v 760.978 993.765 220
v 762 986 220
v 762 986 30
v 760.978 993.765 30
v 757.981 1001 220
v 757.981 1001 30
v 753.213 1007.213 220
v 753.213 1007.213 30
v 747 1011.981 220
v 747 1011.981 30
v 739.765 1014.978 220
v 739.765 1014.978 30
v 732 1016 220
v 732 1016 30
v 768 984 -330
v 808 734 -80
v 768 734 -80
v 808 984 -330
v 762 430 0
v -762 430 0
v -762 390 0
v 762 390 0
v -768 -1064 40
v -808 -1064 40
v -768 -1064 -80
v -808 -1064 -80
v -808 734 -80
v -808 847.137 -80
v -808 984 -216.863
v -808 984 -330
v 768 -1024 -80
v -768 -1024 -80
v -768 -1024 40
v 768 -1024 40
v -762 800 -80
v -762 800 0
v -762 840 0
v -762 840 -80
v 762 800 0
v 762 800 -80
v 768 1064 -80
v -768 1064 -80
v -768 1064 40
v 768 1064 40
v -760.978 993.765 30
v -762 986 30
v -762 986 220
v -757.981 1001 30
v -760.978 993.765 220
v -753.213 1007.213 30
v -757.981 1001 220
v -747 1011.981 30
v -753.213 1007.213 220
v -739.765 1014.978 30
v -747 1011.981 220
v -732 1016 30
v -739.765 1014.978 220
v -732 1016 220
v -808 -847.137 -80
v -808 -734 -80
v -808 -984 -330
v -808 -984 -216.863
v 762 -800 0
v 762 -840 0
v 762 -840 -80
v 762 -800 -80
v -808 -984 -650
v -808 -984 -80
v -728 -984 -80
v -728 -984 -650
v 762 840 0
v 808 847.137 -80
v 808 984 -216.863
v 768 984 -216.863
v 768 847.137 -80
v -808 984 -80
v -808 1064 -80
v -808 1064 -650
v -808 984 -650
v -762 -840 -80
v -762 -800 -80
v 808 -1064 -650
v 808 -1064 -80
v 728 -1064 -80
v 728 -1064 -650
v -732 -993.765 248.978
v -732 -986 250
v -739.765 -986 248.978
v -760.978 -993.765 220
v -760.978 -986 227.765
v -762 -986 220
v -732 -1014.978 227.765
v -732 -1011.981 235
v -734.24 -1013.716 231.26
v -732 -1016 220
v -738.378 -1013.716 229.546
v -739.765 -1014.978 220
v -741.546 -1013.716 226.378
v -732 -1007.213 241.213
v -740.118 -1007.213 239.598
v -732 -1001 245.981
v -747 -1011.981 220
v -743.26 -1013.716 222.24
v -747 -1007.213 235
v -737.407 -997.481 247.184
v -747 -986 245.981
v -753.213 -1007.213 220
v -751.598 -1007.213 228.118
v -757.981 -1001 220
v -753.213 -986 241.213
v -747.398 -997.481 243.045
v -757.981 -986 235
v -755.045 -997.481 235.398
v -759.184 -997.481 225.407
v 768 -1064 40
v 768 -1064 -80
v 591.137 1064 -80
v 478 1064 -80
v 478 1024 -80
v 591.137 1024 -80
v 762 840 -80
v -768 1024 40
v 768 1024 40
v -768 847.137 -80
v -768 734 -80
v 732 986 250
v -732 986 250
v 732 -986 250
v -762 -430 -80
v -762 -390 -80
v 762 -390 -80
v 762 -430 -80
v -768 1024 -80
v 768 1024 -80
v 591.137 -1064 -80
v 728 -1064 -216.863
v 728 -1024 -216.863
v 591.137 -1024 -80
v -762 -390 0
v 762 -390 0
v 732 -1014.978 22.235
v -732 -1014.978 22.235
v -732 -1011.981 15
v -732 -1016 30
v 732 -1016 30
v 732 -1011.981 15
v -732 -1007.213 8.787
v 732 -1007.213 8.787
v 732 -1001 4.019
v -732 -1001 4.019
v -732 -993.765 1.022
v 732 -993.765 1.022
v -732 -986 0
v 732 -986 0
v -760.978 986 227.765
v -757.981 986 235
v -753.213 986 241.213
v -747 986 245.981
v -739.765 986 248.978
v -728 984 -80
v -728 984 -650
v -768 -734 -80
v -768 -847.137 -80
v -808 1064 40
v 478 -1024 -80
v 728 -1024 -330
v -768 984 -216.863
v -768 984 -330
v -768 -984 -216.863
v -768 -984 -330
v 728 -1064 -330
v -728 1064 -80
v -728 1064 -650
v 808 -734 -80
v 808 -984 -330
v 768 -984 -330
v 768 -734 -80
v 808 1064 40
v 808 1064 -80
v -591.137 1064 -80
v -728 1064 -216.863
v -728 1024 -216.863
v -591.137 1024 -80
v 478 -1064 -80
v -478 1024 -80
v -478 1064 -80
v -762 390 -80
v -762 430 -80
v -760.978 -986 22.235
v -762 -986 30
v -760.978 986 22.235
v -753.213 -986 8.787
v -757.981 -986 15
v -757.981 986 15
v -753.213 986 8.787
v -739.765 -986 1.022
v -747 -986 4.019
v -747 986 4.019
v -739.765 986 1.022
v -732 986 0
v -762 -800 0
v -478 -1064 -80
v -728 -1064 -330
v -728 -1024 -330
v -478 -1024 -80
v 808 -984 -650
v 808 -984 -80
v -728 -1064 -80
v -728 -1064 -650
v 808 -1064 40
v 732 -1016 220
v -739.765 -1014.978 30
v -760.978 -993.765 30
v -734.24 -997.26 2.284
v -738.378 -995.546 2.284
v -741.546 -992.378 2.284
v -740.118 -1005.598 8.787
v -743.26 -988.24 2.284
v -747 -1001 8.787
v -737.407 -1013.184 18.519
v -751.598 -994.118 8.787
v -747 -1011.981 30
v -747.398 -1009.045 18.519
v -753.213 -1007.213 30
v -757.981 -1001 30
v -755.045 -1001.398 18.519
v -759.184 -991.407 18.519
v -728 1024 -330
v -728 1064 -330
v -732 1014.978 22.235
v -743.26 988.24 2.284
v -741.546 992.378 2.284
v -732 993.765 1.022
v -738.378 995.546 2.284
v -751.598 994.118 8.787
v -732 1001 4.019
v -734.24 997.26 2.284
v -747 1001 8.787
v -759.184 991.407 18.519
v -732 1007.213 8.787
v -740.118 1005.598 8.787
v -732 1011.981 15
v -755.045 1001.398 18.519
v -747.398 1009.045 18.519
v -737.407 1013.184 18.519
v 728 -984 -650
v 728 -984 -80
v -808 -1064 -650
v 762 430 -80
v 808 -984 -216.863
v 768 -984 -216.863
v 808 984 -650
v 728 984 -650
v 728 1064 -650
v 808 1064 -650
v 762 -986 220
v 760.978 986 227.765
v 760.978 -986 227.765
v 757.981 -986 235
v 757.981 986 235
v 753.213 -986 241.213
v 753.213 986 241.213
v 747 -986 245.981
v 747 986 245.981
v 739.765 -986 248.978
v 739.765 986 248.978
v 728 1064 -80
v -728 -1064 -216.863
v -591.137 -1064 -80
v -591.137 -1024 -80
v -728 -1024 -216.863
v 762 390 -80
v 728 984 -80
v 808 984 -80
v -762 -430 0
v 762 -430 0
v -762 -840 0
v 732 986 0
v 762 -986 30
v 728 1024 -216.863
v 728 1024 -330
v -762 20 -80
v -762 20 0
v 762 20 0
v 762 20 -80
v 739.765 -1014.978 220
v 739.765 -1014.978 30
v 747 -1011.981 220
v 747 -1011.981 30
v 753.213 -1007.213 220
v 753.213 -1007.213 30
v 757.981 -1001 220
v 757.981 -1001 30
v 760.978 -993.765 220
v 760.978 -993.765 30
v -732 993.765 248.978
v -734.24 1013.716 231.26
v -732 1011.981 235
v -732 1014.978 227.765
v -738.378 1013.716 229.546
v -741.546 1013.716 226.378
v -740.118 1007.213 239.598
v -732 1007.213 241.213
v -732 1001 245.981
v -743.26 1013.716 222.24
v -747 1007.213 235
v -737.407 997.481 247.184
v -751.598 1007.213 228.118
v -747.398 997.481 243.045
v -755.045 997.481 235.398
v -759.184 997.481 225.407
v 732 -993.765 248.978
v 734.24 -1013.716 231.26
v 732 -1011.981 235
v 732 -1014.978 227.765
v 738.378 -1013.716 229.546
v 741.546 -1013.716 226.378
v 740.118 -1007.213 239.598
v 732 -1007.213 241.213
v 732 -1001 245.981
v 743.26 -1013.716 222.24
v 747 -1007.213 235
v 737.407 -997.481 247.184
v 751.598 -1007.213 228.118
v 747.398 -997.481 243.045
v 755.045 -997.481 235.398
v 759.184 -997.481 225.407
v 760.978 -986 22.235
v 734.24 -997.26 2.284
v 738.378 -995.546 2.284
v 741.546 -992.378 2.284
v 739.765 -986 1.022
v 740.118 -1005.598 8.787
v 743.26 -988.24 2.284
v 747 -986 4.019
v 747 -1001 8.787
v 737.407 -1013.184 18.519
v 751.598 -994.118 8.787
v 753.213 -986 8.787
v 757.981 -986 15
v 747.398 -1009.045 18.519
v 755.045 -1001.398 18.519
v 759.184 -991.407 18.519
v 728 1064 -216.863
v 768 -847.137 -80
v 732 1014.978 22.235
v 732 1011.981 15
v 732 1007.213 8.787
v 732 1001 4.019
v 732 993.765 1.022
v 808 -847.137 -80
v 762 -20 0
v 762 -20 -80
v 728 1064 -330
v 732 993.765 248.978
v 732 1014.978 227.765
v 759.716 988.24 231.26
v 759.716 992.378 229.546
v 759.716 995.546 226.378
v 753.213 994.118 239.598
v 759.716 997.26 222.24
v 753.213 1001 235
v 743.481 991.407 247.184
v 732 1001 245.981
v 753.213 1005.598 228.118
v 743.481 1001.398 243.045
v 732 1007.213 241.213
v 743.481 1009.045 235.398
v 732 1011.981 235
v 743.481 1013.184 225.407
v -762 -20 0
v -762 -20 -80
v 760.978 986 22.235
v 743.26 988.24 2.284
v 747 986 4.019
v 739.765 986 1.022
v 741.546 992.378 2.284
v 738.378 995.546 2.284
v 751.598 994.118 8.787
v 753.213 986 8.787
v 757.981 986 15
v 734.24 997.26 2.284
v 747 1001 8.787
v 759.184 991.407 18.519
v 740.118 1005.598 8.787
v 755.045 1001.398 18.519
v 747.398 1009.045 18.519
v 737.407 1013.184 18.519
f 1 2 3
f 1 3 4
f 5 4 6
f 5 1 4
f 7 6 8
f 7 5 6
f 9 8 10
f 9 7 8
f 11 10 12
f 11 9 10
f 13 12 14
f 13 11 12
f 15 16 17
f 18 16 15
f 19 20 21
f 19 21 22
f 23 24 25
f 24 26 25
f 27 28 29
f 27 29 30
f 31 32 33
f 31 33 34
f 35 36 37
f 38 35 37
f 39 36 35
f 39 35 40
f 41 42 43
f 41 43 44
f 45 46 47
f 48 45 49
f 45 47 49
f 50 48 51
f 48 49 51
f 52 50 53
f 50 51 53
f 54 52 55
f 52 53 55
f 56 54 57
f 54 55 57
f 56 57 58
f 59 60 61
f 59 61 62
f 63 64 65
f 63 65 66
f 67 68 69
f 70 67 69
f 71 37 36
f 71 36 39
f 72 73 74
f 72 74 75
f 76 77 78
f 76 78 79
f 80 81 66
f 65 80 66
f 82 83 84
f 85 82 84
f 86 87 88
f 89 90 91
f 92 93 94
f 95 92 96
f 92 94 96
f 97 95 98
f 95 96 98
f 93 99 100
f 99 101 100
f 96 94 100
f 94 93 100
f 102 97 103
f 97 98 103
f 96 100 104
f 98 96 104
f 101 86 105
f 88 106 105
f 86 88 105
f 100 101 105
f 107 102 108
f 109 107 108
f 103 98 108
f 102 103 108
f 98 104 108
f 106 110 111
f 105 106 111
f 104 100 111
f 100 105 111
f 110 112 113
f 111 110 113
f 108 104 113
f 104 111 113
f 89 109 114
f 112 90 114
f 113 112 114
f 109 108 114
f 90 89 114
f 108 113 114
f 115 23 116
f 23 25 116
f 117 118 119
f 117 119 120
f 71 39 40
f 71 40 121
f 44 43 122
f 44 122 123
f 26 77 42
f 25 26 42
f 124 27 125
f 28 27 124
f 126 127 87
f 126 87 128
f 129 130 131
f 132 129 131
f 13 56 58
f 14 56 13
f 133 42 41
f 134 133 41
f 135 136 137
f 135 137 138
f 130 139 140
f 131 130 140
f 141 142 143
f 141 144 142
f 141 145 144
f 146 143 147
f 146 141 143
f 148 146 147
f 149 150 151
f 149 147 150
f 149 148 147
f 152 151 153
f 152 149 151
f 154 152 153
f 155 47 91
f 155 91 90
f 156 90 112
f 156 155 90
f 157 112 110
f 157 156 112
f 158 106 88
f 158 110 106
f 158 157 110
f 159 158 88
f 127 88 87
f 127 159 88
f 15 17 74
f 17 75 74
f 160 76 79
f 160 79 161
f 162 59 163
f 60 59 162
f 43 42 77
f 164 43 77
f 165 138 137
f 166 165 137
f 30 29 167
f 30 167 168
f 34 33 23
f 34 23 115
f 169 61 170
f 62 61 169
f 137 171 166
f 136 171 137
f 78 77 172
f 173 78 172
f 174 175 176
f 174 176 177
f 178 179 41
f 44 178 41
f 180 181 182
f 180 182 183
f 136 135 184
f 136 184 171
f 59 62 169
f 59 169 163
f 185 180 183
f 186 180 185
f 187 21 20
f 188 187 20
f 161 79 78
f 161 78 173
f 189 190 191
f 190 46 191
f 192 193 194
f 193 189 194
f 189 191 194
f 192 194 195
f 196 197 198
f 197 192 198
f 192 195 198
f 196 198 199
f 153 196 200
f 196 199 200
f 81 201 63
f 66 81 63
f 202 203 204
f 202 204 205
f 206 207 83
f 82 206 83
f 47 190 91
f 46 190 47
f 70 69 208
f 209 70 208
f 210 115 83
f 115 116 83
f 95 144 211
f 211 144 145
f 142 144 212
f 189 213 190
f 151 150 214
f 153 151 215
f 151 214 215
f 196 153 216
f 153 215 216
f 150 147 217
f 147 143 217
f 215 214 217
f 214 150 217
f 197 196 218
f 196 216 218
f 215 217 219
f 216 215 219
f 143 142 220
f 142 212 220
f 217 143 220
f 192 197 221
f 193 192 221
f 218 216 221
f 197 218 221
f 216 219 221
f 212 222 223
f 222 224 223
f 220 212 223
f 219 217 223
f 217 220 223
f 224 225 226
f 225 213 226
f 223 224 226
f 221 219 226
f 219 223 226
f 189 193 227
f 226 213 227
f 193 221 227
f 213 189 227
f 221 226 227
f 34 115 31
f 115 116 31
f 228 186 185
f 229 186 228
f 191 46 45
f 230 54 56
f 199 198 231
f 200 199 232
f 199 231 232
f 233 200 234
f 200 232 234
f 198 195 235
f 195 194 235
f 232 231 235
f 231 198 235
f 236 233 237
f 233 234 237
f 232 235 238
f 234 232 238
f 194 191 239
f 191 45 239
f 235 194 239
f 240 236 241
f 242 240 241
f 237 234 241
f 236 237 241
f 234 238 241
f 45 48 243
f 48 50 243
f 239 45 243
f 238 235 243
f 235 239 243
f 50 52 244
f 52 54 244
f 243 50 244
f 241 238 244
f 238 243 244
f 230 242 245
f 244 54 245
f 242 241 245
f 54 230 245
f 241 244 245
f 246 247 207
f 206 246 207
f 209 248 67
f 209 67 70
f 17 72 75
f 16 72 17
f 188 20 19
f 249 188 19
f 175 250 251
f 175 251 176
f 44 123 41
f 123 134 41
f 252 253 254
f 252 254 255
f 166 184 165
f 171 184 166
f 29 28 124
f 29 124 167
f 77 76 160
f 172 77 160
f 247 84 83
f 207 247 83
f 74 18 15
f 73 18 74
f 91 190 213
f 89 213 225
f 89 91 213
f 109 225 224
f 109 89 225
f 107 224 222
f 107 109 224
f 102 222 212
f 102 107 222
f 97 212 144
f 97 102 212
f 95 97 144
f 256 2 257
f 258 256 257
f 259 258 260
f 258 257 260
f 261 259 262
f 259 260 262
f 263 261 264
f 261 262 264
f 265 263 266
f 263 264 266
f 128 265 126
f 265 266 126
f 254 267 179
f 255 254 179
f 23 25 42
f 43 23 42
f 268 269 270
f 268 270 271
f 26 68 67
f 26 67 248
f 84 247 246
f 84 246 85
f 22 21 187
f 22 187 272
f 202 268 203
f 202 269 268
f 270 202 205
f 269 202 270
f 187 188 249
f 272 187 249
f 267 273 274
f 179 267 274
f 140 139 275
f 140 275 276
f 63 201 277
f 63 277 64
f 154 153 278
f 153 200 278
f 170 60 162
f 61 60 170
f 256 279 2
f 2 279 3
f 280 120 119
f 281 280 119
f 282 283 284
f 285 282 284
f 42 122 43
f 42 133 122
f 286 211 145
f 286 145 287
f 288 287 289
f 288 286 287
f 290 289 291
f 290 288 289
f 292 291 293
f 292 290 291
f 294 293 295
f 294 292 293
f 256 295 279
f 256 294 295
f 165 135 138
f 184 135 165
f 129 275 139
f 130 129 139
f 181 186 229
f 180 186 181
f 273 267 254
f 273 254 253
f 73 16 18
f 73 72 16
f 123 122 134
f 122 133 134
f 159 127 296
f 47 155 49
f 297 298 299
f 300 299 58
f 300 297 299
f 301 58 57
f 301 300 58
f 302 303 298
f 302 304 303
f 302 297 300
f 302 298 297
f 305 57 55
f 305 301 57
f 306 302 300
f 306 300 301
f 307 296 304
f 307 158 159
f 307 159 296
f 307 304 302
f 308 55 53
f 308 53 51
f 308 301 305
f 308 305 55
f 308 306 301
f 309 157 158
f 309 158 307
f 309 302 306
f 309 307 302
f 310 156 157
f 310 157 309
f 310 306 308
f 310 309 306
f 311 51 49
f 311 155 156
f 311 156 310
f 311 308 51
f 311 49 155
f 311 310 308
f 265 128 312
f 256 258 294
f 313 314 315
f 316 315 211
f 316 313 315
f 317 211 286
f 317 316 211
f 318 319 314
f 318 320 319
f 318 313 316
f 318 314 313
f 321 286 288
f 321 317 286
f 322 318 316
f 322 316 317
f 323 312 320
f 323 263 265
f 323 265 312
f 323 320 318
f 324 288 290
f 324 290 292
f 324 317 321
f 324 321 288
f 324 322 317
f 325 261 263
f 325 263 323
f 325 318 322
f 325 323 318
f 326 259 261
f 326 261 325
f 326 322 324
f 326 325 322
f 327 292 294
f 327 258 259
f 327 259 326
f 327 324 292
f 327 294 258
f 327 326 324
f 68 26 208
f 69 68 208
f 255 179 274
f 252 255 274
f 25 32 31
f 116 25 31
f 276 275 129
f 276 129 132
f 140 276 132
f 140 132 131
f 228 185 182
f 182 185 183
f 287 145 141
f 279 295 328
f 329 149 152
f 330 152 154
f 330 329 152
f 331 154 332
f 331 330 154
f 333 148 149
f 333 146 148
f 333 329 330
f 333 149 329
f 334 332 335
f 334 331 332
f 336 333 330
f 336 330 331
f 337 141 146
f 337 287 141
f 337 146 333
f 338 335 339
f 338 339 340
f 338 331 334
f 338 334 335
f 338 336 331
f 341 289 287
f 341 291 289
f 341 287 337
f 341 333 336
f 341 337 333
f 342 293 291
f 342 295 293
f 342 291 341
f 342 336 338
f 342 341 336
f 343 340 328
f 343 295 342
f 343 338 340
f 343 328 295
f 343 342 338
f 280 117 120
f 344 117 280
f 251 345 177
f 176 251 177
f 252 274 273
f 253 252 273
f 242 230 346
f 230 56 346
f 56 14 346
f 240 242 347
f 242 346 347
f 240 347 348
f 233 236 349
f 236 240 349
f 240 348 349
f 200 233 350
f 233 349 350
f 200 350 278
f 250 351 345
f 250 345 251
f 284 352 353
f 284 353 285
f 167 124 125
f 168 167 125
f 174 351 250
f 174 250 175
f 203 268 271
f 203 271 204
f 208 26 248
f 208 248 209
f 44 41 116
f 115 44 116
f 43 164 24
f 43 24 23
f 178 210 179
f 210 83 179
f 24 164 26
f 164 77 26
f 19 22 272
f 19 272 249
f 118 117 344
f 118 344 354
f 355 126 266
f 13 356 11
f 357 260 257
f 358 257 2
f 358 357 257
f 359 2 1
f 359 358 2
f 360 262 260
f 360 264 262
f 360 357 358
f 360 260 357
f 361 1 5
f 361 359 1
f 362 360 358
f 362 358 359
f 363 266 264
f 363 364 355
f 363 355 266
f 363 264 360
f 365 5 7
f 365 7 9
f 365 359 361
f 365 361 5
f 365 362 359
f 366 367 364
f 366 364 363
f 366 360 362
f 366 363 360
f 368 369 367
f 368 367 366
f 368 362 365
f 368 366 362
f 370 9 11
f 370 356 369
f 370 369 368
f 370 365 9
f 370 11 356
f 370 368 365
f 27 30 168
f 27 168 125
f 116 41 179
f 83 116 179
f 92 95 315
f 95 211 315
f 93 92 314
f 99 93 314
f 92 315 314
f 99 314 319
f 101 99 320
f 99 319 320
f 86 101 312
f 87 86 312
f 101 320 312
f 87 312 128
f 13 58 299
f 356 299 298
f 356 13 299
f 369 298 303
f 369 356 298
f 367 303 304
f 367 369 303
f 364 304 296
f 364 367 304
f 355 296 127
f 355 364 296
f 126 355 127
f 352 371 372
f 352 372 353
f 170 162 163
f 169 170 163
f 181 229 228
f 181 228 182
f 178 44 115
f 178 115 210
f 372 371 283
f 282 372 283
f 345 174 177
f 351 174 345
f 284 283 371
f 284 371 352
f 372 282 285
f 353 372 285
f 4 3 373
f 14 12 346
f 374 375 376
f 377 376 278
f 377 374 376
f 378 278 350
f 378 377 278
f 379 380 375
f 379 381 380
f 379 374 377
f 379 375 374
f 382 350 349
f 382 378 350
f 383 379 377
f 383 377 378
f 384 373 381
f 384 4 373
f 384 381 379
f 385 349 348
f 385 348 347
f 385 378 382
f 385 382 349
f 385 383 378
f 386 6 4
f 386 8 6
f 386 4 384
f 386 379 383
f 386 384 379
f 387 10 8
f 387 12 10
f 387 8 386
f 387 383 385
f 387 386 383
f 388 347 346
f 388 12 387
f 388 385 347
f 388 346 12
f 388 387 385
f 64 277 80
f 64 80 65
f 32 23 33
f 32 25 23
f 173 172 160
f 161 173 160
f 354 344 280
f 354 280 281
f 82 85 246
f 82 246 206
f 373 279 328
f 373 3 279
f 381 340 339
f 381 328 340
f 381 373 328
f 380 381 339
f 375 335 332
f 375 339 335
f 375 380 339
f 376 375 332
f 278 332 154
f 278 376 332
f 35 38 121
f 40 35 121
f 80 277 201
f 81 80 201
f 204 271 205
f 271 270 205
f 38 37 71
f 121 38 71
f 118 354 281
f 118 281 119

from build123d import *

# Parameters (mm, degrees)
F1_W      = 1524
F1_H      = 2032
F2_DEPTH  = 250
F3_R      = 30
F5_DEPTH  = 80
F4_W      = 1536
F4_H      = 40
F6_DEPTH  = 80
F4_W_2    = 1524
F7_DEPTH  = 40
F8_DEPTH  = 40
F9_DEPTH  = 40
F10_DEPTH = 40
F11_W     = 80
F11_H     = 80
F13_DEPTH = 570
F11_W_2   = 40
F15_DEPTH = 40
F17_DEPTH = 40
F19_DEPTH = 40
F21_DEPTH = 40


with BuildPart() as f2:
    # F1 (on Top) → F2 (new body)
    with BuildSketch(Plane.XY):
        Rectangle(F1_W, F1_H)
    extrude(amount=F2_DEPTH)

    # F3
    f3_edges = [f2.edges().sort_by_distance(p)[0] for p in [
        (-762, 0, 250),
        (0, 1016, 250),
        (762, 0, 250),
        (0, -1016, 250),
        (-762, -1016, 125),
        (-762, 1016, 125),
        (762, -1016, 125),
        (0, -1016, 0),
        (-762, 0, 0),
        (762, 1016, 125),
        (762, 0, 0),
        (0, 1016, 0),
    ]]
    fillet(f3_edges, radius=F3_R)


with BuildPart() as f5:
    # F4 (on face) → F5 (new body)
    with BuildSketch(Plane.XY):
        Polygon((-768, 840), (-768, 1024), (-768, 1064), (-808, 1064), (-808, -1064), (-768, -1064), (-768, -1024), (-768, -840), (-768, -800), (-768, -430), (-768, -390), (-768, -20), (-768, 20), (-768, 390), (-768, 430), (-768, 800), align=None)
    extrude(amount=-F5_DEPTH)

    # F4 (on face) → F9 (join)
    with BuildSketch(Plane.XY):
        Polygon((-768, 840), (-768, 1024), (-768, 1064), (-808, 1064), (-808, -1064), (-768, -1064), (-768, -1024), (-768, -840), (-768, -800), (-768, -430), (-768, -390), (-768, -20), (-768, 20), (-768, 390), (-768, 430), (-768, 800), align=None)
    extrude(amount=F9_DEPTH)


with BuildPart() as f5b:
    # F4 (on face) → F5, piece 2 (new body)
    with BuildSketch(Plane.XY):
        Polygon((768, 1064), (768, 1024), (768, 840), (768, 800), (768, 430), (768, 390), (768, 20), (768, -20), (768, -390), (768, -430), (768, -800), (768, -840), (768, -1024), (768, -1064), (808, -1064), (808, 1064), align=None)
    extrude(amount=-F5_DEPTH)

    # F4 (on face) → F7 (join)
    with BuildSketch(Plane.XY):
        Polygon((768, 1064), (768, 1024), (768, 840), (768, 800), (768, 430), (768, 390), (768, 20), (768, -20), (768, -390), (768, -430), (768, -800), (768, -840), (768, -1024), (768, -1064), (808, -1064), (808, 1064), align=None)
    extrude(amount=F7_DEPTH)


with BuildPart() as f6:
    # F4 (on face) → F6 (new body)
    with BuildSketch(Plane.XY):
        with Locations((0, 1044)):
            Rectangle(F4_W, F4_H)
    extrude(amount=-F6_DEPTH)

    # F4 (on face) → F8 (join)
    with BuildSketch(Plane.XY):
        with Locations((0, 1044)):
            Rectangle(F4_W, F4_H)
    extrude(amount=F8_DEPTH)


with BuildPart() as f6b:
    # F4 (on face) → F6, piece 2 (new body)
    with BuildSketch(Plane.XY):
        with Locations((0, 820)):
            Rectangle(F4_W_2, F4_H)
    extrude(amount=-F6_DEPTH)


with BuildPart() as f6c:
    # F4 (on face) → F6, piece 3 (new body)
    with BuildSketch(Plane.XY):
        with Locations((0, 410)):
            Rectangle(F4_W_2, F4_H)
    extrude(amount=-F6_DEPTH)


with BuildPart() as f6d:
    # F4 (on face) → F6, piece 4 (new body)
    with BuildSketch(Plane.XY):
        Rectangle(F4_W_2, F4_H)
    extrude(amount=-F6_DEPTH)


with BuildPart() as f6e:
    # F4 (on face) → F6, piece 5 (new body)
    with BuildSketch(Plane.XY):
        with Locations((0, -410)):
            Rectangle(F4_W_2, F4_H)
    extrude(amount=-F6_DEPTH)


with BuildPart() as f6f:
    # F4 (on face) → F6, piece 6 (new body)
    with BuildSketch(Plane.XY):
        with Locations((0, -820)):
            Rectangle(F4_W_2, F4_H)
    extrude(amount=-F6_DEPTH)


with BuildPart() as f6g:
    # F4 (on face) → F6, piece 7 (new body)
    with BuildSketch(Plane.XY):
        with Locations((0, -1044)):
            Rectangle(F4_W, F4_H)
    extrude(amount=-F6_DEPTH)

    # F4 (on face) → F10 (join)
    with BuildSketch(Plane.XY):
        with Locations((0, -1044)):
            Rectangle(F4_W, F4_H)
    extrude(amount=F10_DEPTH)


with BuildPart() as f13:
    # F11 (on face) → F13 (new body, through all)
    with BuildSketch(Plane(origin=(0, 0, -80), x_dir=(1, 0, 0), z_dir=(0, 0, -1))):
        with Locations((-768, 1024)):
            Rectangle(F11_W, F11_H)
    extrude(amount=F13_DEPTH)


with BuildPart() as f13b:
    # F11 (on face) → F13, piece 2 (new body, through all)
    with BuildSketch(Plane(origin=(0, 0, -80), x_dir=(1, 0, 0), z_dir=(0, 0, -1))):
        with Locations((788, 1024)):
            Rectangle(F11_W_2, F11_H)
        with Locations((748, 1024)):
            Rectangle(F11_W_2, F11_H)
    extrude(amount=F13_DEPTH)


with BuildPart() as f13c:
    # F11 (on face) → F13, piece 3 (new body, through all)
    with BuildSketch(Plane(origin=(0, 0, -80), x_dir=(1, 0, 0), z_dir=(0, 0, -1))):
        with Locations((788, -1024)):
            Rectangle(F11_W_2, F11_H)
        with Locations((748, -1024)):
            Rectangle(F11_W_2, F11_H)
    extrude(amount=F13_DEPTH)


with BuildPart() as f13d:
    # F11 (on face) → F13, piece 4 (new body, through all)
    with BuildSketch(Plane(origin=(0, 0, -80), x_dir=(1, 0, 0), z_dir=(0, 0, -1))):
        with Locations((-768, -1024)):
            Rectangle(F11_W, F11_H)
    extrude(amount=F13_DEPTH)


with BuildPart() as f15:
    # F14 (on face) → F15 (new body, through all)
    with BuildSketch(Plane.XZ.offset(1064)):
        Polygon((-728, -216.8629150101), (-728, -330), (-478, -80), (-591.1370849899, -80), align=None)
    extrude(amount=-F15_DEPTH)


with BuildPart() as f15b:
    # F14 (on face) → F15, piece 2 (new body, through all)
    with BuildSketch(Plane.XZ.offset(1064)):
        Polygon((591.1370849899, -80), (478, -80), (728, -330), (728, -216.8629150101), align=None)
    extrude(amount=-F15_DEPTH)


with BuildPart() as f17:
    # F16 (on face) → F17 (new body, through all)
    with BuildSketch(Plane(origin=(0, 1064, 0), x_dir=(-1, 0, 0), z_dir=(0, 1, 0))):
        Polygon((-591.1370849898, -80), (-728, -216.8629150102), (-728, -330), (-478, -80), align=None)
    extrude(amount=-F17_DEPTH)


with BuildPart() as f17b:
    # F16 (on face) → F17, piece 2 (new body, through all)
    with BuildSketch(Plane(origin=(0, 1064, 0), x_dir=(-1, 0, 0), z_dir=(0, 1, 0))):
        Polygon((591.1370849899, -80), (478, -80), (728, -330), (728, -216.8629150102), align=None)
    extrude(amount=-F17_DEPTH)


with BuildPart() as f19:
    # F18 (on face) → F19 (new body, through all)
    with BuildSketch(Plane.YZ.offset(808)):
        Polygon((-984, -330), (-734, -80), (-847.1370849899, -80), (-984, -216.8629150101), align=None)
    extrude(amount=-F19_DEPTH)


with BuildPart() as f19b:
    # F18 (on face) → F19, piece 2 (new body, through all)
    with BuildSketch(Plane.YZ.offset(808)):
        Polygon((734, -80), (984, -330), (984, -216.8629150101), (847.1370849899, -80), align=None)
    extrude(amount=-F19_DEPTH)


with BuildPart() as f21:
    # F20 (on face) → F21 (new body, through all)
    with BuildSketch(Plane(origin=(-808, 0, 0), x_dir=(0, -1, 0), z_dir=(-1, 0, 0))):
        Polygon((-847.1370849899, -80), (-984, -216.8629150101), (-984, -330), (-734, -80), align=None)
    extrude(amount=-F21_DEPTH)


with BuildPart() as f21b:
    # F20 (on face) → F21, piece 2 (new body, through all)
    with BuildSketch(Plane(origin=(-808, 0, 0), x_dir=(0, -1, 0), z_dir=(-1, 0, 0))):
        Polygon((984, -216.8629150101), (847.1370849899, -80), (734, -80), (984, -330), align=None)
    extrude(amount=-F21_DEPTH)


solid = Compound([f2.part, f5.part, f5b.part, f6.part, f6b.part, f6c.part, f6d.part, f6e.part, f6f.part, f6g.part, f13.part, f13b.part, f13c.part, f13d.part, f15.part, f15b.part, f17.part, f17b.part, f19.part, f19b.part, f21.part, f21b.part])
